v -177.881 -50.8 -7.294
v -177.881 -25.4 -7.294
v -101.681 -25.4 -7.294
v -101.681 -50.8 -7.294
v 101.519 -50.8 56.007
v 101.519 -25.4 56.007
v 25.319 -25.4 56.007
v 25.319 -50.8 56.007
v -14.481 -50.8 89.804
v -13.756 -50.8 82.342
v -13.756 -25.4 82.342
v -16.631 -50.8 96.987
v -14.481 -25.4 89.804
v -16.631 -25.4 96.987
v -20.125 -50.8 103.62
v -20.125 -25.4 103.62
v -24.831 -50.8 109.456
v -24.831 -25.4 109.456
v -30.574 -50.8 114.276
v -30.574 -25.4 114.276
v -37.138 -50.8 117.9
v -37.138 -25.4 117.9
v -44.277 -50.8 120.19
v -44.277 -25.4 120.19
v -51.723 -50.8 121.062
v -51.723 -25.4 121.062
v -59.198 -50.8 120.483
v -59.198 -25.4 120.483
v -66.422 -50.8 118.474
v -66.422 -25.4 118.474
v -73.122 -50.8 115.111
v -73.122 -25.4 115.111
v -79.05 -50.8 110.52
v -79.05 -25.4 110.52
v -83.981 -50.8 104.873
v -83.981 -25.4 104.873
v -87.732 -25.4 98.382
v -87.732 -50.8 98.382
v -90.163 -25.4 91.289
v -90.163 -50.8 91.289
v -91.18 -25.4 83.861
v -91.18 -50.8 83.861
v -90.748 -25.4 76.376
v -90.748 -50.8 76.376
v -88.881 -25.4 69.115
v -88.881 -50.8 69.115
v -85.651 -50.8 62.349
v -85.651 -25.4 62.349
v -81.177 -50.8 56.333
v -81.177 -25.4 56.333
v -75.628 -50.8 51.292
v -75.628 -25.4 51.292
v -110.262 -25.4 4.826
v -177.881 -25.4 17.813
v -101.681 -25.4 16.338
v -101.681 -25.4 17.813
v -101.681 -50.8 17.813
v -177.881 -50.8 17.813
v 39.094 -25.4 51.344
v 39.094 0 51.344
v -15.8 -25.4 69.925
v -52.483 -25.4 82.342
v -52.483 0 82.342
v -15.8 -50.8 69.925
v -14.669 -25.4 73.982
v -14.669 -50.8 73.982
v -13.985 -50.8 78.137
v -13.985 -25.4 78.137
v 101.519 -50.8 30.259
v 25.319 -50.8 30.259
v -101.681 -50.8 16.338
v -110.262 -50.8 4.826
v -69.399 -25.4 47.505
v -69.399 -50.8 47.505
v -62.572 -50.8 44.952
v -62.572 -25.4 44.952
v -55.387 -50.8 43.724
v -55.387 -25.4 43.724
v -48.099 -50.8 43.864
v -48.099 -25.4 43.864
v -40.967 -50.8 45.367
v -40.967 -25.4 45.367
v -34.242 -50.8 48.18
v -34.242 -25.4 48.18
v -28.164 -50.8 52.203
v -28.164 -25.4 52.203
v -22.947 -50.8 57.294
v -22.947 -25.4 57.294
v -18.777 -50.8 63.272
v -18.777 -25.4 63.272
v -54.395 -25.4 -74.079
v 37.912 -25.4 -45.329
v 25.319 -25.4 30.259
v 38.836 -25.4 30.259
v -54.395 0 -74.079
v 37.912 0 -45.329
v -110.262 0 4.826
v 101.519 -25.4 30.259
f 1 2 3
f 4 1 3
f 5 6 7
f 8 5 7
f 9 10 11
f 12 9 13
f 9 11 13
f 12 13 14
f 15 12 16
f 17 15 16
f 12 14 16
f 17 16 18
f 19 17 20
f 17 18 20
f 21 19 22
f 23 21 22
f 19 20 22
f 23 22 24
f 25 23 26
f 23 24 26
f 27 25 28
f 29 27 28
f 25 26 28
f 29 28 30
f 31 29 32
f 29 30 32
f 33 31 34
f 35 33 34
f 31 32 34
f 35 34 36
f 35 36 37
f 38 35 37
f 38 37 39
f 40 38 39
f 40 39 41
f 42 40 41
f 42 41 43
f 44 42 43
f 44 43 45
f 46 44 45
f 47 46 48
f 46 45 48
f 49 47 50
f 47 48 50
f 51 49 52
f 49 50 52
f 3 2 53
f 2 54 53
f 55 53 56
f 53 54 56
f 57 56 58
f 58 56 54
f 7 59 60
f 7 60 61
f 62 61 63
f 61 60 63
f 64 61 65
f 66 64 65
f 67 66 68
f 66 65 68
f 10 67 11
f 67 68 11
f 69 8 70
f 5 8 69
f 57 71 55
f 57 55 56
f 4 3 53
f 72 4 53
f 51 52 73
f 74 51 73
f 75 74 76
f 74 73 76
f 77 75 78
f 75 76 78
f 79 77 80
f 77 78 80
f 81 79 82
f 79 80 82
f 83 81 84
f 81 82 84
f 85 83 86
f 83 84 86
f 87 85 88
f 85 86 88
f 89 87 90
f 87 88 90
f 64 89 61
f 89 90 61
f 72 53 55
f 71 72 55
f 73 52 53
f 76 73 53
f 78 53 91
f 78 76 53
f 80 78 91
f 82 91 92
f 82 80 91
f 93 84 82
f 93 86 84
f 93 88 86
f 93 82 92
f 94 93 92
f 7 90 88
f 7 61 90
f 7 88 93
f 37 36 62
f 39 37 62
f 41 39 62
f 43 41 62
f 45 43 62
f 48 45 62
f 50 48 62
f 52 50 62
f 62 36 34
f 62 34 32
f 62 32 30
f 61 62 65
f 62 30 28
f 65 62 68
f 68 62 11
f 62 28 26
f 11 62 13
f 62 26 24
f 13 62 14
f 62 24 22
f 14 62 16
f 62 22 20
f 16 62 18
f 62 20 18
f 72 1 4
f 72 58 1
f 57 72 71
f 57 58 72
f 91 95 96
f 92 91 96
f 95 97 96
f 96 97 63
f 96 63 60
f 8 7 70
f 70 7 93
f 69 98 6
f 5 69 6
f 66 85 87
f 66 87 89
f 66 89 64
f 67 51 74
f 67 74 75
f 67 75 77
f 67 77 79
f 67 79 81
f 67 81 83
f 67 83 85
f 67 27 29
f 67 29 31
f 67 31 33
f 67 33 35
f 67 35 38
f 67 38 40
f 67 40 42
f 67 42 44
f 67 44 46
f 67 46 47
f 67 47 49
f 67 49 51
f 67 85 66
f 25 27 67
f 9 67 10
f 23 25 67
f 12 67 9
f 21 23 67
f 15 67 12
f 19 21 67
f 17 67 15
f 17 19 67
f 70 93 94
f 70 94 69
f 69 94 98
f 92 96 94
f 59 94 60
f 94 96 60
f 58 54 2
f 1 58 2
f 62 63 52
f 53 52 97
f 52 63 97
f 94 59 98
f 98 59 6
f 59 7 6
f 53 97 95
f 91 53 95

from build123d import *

# Parameters (mm, degrees)
F1_DEPTH = 25.4
F3_DEPTH = 25.4
F5_DEPTH = 25.4
F7_DEPTH = 25.4


with BuildPart() as f1:
    # F0 (on Front) → F1 (new body)
    with BuildSketch(Plane.XZ):
        Polygon((-110.262432, 4.826024), (-54.395086, -74.079327), (37.912321, -45.329418), (39.094091, 51.344354), (-52.482943, 82.342122), align=None)
    extrude(amount=F1_DEPTH)

    # F2 (on face) → F3 (join)
    with BuildSketch(Plane.XZ.offset(25.4)):
        with BuildLine():
            Line((-52.482943, 82.342122), (-75.627503, 51.291727))
            ThreePointArc((-75.627503, 51.291727), (-40.966677, 45.366815), (-15.8002, 69.925437))
            Line((-15.8002, 69.925437), (-52.482943, 82.342122))
        make_face()
        with BuildLine():
            ThreePointArc((-15.8002, 69.925437), (-14.27026, 76.050183), (-13.755722, 82.342122))
            ThreePointArc((-13.755722, 82.342122), (-69.85351, 116.955141), (-75.627503, 51.291727))
            Line((-75.627503, 51.291727), (-52.482943, 82.342122))
            Line((-52.482943, 82.342122), (-15.8002, 69.925437))
        make_face()
    extrude(amount=F3_DEPTH)

    # F6 (on face) → F7 (join)
    with BuildSketch(Plane.XZ.offset(25.4)):
        Polygon((101.518723, 56.007156), (25.318723, 56.007156), (39.094091, 51.344354), (38.836337, 30.258982), (101.518723, 30.258982), align=None)
        Polygon((39.094091, 51.344354), (25.318723, 56.007156), (25.318723, 30.258982), (38.836337, 30.258982), align=None)
    extrude(amount=F7_DEPTH)


with BuildPart() as f5:
    # F4 (on face) → F5 (new body)
    with BuildSketch(Plane.XZ.offset(25.4)):
        Polygon((-177.881277, -7.293741), (-101.681277, -7.293741), (-110.262432, 4.826024), (-101.681277, 16.338374), (-101.681277, 17.812694), (-177.881277, 17.812694), align=None)
    extrude(amount=F5_DEPTH)


solid = Compound([f1.part, f5.part])
